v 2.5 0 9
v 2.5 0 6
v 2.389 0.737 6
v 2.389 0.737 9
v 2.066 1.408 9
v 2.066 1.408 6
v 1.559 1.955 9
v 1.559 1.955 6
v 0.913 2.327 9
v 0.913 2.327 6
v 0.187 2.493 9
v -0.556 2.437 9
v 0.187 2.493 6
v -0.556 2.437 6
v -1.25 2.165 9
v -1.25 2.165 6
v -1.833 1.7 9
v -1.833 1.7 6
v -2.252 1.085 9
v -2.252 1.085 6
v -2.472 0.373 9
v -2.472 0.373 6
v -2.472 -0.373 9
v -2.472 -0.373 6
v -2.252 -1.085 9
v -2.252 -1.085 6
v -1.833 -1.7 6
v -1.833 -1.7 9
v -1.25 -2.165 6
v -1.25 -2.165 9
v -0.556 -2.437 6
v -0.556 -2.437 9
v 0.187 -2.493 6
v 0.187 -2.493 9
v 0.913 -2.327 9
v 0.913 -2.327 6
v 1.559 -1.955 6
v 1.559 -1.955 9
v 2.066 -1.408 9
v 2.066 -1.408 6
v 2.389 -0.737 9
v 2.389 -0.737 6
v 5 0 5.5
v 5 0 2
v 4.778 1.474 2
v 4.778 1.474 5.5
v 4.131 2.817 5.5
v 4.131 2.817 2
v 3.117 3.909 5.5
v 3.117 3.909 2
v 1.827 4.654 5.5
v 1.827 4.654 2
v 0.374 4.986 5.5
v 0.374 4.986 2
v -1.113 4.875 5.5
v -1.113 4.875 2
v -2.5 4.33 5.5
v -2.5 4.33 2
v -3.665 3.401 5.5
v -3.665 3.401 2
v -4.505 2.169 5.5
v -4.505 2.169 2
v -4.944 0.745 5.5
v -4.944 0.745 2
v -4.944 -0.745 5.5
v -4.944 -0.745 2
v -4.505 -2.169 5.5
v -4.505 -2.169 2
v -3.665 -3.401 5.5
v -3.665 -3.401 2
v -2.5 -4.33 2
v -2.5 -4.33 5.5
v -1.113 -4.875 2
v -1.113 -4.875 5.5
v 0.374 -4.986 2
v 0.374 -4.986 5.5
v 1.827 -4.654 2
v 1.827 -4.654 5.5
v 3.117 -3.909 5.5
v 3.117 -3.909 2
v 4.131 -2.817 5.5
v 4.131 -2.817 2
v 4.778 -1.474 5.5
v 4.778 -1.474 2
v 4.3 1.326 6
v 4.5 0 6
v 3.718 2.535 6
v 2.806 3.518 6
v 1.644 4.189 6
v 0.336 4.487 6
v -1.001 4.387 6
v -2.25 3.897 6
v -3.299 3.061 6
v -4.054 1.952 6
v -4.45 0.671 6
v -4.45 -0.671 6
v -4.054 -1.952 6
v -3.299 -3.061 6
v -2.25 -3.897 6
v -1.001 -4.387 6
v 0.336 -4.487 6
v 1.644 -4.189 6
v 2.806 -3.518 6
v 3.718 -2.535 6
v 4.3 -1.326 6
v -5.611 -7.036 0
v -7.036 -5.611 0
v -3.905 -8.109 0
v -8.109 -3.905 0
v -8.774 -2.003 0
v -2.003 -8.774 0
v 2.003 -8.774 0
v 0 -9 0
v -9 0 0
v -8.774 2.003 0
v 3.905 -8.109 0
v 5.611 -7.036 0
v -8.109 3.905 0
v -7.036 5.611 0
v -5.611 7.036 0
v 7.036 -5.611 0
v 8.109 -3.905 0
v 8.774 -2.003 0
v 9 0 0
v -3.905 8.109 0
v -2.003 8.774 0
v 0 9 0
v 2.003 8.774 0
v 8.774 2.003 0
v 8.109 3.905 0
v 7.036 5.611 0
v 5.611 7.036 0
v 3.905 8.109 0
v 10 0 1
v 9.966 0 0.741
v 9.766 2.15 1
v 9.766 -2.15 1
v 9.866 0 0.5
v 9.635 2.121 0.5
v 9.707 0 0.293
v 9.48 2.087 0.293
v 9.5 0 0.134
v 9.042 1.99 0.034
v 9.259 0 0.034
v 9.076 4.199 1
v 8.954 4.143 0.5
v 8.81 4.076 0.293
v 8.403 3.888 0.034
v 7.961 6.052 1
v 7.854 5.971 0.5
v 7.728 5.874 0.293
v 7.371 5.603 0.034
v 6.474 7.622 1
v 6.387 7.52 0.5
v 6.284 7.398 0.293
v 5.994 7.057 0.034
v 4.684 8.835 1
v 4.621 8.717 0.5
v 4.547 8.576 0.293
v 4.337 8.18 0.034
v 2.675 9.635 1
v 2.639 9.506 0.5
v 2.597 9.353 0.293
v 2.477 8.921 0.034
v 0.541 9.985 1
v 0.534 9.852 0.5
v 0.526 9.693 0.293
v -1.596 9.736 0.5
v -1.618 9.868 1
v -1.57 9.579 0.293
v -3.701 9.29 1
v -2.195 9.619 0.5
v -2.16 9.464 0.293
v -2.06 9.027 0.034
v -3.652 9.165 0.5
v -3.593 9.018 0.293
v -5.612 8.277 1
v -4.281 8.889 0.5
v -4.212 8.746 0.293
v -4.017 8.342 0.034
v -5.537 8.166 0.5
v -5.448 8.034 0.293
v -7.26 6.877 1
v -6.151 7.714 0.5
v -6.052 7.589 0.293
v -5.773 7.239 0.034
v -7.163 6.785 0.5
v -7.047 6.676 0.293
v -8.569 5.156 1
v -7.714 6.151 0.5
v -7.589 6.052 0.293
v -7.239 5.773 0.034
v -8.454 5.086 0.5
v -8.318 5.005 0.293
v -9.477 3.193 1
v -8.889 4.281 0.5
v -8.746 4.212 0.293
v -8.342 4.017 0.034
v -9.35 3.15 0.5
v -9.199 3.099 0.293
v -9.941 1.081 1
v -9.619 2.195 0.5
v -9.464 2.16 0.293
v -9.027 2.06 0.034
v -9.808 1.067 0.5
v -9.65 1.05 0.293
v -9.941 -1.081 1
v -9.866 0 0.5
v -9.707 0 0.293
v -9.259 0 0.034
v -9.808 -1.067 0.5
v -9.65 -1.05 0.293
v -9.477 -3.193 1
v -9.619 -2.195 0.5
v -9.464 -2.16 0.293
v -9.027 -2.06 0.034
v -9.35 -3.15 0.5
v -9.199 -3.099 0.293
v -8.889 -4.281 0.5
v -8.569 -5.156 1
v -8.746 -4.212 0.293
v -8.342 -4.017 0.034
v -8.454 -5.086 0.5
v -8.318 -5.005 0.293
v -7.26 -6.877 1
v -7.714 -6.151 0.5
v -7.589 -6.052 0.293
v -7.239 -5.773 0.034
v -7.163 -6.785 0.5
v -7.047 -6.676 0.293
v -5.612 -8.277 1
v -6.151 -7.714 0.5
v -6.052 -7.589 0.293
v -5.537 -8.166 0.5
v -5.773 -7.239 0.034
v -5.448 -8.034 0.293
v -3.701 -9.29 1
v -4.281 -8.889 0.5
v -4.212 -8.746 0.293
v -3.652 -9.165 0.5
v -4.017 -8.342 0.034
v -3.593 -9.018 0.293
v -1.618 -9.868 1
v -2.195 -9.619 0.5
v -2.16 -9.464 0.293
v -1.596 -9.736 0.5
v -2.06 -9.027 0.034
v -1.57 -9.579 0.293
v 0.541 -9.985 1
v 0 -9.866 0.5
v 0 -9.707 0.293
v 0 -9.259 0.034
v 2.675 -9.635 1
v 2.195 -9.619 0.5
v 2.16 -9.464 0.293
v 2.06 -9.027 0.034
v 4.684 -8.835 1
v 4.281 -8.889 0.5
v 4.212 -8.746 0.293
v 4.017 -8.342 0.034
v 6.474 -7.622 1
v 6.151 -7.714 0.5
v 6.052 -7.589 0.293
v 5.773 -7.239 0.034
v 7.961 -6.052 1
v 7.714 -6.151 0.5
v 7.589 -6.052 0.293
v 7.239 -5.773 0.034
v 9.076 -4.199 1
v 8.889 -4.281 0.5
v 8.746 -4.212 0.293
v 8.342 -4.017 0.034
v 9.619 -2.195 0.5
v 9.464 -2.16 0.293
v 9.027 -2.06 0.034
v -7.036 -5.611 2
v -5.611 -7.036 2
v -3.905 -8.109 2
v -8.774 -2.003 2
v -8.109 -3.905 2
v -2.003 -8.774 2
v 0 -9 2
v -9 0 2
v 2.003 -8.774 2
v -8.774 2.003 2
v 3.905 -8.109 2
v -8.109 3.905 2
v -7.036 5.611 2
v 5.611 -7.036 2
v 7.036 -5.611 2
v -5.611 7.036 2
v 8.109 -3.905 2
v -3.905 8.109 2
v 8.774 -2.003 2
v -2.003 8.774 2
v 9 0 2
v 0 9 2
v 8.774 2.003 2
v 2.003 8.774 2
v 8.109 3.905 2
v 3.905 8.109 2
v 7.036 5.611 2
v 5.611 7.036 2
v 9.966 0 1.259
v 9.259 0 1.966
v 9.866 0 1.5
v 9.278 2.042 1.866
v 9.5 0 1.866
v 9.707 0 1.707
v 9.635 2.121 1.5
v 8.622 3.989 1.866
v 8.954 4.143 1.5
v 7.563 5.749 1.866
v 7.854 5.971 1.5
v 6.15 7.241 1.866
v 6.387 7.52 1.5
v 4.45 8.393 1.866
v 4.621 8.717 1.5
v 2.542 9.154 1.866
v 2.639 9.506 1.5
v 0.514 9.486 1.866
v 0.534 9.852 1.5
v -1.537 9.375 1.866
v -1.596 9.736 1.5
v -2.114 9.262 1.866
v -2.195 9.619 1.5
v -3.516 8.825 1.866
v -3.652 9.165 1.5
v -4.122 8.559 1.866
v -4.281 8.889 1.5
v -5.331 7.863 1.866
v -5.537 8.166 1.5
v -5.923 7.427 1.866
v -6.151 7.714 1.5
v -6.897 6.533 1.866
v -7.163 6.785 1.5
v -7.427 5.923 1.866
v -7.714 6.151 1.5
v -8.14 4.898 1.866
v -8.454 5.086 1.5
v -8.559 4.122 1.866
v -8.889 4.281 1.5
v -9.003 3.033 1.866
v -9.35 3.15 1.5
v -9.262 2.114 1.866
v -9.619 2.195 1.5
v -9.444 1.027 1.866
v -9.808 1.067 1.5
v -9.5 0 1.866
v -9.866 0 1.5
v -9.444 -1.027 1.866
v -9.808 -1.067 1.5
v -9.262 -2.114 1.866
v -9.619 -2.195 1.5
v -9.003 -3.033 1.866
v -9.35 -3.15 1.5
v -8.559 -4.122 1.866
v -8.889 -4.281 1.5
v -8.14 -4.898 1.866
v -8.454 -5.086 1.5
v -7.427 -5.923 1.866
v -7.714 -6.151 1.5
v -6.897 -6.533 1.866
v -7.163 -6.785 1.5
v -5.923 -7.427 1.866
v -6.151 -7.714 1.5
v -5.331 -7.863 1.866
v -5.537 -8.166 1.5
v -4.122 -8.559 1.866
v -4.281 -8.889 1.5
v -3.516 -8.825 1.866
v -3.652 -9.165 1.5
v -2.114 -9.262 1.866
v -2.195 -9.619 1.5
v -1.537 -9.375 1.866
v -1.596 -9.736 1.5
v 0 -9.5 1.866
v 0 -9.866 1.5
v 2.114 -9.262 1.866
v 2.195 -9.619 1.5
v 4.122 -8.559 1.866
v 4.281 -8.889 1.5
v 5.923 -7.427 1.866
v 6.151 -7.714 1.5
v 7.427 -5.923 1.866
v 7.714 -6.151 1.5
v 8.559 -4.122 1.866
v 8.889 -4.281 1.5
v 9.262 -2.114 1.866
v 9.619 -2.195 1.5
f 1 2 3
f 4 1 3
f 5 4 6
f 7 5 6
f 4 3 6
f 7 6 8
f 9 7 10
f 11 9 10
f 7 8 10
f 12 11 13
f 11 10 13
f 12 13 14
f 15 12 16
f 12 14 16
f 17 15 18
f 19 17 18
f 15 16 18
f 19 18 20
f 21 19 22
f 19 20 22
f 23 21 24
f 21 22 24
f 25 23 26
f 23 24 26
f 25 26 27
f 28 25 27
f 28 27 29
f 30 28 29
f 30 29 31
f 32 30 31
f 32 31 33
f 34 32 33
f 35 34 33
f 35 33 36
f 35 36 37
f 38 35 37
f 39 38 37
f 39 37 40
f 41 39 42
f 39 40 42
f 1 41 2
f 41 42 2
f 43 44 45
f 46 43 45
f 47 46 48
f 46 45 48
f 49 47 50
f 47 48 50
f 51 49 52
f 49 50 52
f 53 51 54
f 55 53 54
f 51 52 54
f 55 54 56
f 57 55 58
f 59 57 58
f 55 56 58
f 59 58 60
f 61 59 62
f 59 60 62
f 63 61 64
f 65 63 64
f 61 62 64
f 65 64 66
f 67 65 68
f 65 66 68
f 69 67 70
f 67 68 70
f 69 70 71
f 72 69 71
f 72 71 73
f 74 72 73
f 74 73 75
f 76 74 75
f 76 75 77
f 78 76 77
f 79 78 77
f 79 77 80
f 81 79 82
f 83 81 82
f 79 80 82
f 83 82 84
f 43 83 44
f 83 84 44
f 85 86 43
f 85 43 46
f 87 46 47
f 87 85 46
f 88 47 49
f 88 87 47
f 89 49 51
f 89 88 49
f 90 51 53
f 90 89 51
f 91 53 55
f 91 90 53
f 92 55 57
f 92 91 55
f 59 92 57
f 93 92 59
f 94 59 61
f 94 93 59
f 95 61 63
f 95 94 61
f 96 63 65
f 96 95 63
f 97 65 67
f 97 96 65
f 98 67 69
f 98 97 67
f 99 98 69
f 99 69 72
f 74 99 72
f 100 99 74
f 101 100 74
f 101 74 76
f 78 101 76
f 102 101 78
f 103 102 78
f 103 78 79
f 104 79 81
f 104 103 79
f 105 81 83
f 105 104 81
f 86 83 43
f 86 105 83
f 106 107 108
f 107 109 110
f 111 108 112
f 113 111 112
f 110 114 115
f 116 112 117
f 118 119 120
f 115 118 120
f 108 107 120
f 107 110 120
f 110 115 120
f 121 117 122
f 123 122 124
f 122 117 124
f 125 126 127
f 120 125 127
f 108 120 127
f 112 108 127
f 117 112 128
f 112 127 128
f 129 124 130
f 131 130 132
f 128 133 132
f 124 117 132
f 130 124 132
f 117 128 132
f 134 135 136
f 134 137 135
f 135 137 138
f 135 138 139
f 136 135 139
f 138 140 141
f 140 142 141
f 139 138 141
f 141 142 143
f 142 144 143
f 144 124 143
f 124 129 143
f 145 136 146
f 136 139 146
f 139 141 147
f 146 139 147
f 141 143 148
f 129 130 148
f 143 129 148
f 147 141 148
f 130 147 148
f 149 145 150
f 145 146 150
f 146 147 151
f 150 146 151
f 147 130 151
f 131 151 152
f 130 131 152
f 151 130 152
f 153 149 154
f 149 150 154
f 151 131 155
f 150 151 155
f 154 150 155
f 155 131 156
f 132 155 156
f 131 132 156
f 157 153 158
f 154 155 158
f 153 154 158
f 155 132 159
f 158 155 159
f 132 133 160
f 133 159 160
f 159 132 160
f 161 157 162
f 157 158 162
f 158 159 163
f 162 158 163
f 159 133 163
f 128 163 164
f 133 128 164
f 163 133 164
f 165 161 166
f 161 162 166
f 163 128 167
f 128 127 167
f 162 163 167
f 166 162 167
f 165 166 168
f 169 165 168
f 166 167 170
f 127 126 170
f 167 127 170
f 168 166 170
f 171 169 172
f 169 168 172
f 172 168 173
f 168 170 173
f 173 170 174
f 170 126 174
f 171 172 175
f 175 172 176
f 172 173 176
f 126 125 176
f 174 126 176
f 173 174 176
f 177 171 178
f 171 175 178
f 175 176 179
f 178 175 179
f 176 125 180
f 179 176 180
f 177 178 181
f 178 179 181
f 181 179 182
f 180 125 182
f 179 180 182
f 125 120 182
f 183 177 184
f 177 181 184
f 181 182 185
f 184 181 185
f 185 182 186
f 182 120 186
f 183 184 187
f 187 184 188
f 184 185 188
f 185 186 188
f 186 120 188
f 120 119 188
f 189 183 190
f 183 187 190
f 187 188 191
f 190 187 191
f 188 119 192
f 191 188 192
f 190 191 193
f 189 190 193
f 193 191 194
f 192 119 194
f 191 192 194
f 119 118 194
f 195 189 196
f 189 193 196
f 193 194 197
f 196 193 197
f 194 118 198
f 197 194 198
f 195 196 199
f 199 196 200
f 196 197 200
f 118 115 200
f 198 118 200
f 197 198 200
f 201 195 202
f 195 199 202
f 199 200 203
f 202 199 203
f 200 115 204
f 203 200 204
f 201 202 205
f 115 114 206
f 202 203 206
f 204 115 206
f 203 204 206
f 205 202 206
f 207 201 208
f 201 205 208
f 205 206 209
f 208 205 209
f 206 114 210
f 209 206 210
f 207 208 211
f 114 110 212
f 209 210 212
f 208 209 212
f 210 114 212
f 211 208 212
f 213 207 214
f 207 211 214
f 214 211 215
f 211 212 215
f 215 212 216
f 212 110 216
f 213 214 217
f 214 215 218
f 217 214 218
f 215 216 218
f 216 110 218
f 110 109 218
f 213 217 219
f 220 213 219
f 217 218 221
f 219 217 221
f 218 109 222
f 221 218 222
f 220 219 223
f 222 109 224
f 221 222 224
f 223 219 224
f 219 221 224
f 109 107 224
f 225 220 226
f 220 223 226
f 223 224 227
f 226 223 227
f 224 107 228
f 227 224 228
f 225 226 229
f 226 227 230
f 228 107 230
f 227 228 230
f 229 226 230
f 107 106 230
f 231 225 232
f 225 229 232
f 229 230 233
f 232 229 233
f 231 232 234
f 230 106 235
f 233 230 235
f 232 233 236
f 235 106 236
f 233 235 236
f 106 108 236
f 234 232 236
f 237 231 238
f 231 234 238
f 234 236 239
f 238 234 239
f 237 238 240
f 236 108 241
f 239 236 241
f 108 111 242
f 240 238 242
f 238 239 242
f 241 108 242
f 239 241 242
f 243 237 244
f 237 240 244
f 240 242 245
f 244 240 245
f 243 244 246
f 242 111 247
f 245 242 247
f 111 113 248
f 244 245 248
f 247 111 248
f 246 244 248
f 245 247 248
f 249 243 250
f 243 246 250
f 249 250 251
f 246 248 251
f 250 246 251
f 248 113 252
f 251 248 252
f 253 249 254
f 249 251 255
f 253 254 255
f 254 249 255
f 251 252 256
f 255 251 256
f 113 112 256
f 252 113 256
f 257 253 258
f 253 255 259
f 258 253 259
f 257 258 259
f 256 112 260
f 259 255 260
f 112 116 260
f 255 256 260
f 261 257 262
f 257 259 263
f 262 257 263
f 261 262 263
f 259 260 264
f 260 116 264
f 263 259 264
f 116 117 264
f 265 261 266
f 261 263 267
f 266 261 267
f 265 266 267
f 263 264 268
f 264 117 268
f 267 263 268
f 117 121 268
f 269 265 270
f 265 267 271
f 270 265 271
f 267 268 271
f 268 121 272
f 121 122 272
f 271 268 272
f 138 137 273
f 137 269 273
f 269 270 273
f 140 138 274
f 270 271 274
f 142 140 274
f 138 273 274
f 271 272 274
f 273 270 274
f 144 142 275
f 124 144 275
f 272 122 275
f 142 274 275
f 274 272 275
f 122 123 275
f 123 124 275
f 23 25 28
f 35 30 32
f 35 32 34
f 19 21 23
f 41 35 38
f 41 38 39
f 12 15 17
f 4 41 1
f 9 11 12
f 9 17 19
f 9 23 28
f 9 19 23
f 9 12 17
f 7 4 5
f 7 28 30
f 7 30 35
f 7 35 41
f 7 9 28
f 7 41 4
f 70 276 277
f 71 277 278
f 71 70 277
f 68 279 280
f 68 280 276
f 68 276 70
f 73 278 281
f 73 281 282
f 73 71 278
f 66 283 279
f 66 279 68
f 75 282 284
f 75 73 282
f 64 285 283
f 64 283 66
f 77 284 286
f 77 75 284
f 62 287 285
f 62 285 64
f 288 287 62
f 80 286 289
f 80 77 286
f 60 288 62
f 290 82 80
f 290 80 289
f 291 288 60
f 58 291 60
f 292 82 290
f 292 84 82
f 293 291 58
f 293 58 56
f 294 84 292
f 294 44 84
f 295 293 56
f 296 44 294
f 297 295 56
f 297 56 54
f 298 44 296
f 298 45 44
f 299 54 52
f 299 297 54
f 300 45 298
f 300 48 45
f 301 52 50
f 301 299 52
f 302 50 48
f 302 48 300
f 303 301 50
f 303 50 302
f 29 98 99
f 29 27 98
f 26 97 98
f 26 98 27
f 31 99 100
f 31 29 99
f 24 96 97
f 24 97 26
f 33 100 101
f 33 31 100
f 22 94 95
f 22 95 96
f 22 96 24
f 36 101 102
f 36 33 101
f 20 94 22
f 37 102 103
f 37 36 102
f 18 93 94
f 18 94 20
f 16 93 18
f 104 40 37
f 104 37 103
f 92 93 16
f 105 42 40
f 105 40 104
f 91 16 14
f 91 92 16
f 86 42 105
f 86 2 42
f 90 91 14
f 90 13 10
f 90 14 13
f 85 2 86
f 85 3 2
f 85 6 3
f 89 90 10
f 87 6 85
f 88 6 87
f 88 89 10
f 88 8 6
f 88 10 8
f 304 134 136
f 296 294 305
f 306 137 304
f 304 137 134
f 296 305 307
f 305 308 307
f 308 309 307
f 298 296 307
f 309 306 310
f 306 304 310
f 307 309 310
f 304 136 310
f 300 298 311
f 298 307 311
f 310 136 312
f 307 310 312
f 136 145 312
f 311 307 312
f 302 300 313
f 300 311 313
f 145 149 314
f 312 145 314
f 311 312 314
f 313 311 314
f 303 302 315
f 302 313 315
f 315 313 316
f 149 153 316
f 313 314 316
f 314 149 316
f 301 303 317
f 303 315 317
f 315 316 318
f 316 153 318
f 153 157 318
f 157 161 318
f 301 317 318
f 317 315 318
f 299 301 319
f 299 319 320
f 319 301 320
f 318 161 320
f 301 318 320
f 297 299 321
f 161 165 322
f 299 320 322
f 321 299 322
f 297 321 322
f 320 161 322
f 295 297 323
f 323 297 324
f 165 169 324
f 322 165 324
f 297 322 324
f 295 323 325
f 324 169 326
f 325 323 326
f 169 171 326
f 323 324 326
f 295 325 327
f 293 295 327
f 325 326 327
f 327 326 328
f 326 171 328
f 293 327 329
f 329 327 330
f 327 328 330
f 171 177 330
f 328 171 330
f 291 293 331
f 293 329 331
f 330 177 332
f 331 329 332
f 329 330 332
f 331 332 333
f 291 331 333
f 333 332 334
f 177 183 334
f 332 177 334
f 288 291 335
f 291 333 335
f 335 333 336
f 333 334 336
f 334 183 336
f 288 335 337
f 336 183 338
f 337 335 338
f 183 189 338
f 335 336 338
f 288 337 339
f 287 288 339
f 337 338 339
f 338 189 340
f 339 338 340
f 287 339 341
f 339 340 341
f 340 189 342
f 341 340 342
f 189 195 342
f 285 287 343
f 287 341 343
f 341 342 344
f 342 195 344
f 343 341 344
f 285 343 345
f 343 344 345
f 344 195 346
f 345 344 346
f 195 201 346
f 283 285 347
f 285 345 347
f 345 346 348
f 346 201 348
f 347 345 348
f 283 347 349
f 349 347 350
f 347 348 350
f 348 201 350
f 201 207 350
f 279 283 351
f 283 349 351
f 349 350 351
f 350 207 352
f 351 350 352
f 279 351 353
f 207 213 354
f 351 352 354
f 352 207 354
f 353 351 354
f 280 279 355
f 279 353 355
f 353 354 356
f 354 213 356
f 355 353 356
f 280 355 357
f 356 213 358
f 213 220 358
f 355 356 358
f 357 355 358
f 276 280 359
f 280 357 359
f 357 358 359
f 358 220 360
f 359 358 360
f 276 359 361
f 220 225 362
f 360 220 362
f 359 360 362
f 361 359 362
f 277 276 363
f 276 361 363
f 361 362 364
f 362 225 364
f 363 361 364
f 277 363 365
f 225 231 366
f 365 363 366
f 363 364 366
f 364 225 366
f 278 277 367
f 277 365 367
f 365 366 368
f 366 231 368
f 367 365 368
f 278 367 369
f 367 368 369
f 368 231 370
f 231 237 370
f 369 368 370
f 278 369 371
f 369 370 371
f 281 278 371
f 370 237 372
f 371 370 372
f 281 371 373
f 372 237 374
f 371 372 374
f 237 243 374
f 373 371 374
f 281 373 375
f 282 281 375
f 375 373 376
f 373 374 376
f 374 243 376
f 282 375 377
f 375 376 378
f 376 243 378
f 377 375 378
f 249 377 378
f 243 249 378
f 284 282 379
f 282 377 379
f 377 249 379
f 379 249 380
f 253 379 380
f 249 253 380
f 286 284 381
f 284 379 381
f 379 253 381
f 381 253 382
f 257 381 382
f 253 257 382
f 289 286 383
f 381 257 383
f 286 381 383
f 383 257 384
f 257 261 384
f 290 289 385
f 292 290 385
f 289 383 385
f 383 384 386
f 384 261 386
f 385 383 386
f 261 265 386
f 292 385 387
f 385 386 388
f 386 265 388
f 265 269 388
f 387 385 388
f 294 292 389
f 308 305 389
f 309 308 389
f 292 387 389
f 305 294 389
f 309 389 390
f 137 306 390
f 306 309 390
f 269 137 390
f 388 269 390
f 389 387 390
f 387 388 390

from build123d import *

# Parameters (mm, degrees)
F0_R     = 10
F1_DEPTH = 2
F2_R     = 5
F3_DEPTH = 4
F4_SIZE  = 0.5
F5_R     = 0.99999
F6_R     = 2.5
F7_DEPTH = 3


# Not quite as in the source:
# - a fillet or chamfer is up to 0.001 mm smaller than in the source, because OpenCascade refuses the exact size


with BuildPart() as f1:
    # F0 (on Top) → F1 (new body)
    with BuildSketch(Plane.XY):
        Circle(F0_R)
    extrude(amount=F1_DEPTH)

    # F2 (on face) → F3 (join)
    with BuildSketch(Plane.XY.offset(2)):
        Circle(F2_R)
    extrude(amount=F3_DEPTH)

    # F4
    f4_edges = [f1.edges().sort_by_distance(p)[0] for p in [
        (-5, 0, 6),
    ]]
    chamfer(f4_edges, length=F4_SIZE)

    # F5 (radius 1 in the source; OpenCascade refuses exactly that, so slightly less here)
    f5_edges = [f1.edges().sort_by_distance(p)[0] for p in [
        (-10, 0, 0),
        (-10, 0, 2),
    ]]
    fillet(f5_edges, radius=F5_R)

    # F6 (on face) → F7 (join)
    with BuildSketch(Plane.XY.offset(6)):
        Circle(F6_R)
    extrude(amount=F7_DEPTH)


solid = f1.part
